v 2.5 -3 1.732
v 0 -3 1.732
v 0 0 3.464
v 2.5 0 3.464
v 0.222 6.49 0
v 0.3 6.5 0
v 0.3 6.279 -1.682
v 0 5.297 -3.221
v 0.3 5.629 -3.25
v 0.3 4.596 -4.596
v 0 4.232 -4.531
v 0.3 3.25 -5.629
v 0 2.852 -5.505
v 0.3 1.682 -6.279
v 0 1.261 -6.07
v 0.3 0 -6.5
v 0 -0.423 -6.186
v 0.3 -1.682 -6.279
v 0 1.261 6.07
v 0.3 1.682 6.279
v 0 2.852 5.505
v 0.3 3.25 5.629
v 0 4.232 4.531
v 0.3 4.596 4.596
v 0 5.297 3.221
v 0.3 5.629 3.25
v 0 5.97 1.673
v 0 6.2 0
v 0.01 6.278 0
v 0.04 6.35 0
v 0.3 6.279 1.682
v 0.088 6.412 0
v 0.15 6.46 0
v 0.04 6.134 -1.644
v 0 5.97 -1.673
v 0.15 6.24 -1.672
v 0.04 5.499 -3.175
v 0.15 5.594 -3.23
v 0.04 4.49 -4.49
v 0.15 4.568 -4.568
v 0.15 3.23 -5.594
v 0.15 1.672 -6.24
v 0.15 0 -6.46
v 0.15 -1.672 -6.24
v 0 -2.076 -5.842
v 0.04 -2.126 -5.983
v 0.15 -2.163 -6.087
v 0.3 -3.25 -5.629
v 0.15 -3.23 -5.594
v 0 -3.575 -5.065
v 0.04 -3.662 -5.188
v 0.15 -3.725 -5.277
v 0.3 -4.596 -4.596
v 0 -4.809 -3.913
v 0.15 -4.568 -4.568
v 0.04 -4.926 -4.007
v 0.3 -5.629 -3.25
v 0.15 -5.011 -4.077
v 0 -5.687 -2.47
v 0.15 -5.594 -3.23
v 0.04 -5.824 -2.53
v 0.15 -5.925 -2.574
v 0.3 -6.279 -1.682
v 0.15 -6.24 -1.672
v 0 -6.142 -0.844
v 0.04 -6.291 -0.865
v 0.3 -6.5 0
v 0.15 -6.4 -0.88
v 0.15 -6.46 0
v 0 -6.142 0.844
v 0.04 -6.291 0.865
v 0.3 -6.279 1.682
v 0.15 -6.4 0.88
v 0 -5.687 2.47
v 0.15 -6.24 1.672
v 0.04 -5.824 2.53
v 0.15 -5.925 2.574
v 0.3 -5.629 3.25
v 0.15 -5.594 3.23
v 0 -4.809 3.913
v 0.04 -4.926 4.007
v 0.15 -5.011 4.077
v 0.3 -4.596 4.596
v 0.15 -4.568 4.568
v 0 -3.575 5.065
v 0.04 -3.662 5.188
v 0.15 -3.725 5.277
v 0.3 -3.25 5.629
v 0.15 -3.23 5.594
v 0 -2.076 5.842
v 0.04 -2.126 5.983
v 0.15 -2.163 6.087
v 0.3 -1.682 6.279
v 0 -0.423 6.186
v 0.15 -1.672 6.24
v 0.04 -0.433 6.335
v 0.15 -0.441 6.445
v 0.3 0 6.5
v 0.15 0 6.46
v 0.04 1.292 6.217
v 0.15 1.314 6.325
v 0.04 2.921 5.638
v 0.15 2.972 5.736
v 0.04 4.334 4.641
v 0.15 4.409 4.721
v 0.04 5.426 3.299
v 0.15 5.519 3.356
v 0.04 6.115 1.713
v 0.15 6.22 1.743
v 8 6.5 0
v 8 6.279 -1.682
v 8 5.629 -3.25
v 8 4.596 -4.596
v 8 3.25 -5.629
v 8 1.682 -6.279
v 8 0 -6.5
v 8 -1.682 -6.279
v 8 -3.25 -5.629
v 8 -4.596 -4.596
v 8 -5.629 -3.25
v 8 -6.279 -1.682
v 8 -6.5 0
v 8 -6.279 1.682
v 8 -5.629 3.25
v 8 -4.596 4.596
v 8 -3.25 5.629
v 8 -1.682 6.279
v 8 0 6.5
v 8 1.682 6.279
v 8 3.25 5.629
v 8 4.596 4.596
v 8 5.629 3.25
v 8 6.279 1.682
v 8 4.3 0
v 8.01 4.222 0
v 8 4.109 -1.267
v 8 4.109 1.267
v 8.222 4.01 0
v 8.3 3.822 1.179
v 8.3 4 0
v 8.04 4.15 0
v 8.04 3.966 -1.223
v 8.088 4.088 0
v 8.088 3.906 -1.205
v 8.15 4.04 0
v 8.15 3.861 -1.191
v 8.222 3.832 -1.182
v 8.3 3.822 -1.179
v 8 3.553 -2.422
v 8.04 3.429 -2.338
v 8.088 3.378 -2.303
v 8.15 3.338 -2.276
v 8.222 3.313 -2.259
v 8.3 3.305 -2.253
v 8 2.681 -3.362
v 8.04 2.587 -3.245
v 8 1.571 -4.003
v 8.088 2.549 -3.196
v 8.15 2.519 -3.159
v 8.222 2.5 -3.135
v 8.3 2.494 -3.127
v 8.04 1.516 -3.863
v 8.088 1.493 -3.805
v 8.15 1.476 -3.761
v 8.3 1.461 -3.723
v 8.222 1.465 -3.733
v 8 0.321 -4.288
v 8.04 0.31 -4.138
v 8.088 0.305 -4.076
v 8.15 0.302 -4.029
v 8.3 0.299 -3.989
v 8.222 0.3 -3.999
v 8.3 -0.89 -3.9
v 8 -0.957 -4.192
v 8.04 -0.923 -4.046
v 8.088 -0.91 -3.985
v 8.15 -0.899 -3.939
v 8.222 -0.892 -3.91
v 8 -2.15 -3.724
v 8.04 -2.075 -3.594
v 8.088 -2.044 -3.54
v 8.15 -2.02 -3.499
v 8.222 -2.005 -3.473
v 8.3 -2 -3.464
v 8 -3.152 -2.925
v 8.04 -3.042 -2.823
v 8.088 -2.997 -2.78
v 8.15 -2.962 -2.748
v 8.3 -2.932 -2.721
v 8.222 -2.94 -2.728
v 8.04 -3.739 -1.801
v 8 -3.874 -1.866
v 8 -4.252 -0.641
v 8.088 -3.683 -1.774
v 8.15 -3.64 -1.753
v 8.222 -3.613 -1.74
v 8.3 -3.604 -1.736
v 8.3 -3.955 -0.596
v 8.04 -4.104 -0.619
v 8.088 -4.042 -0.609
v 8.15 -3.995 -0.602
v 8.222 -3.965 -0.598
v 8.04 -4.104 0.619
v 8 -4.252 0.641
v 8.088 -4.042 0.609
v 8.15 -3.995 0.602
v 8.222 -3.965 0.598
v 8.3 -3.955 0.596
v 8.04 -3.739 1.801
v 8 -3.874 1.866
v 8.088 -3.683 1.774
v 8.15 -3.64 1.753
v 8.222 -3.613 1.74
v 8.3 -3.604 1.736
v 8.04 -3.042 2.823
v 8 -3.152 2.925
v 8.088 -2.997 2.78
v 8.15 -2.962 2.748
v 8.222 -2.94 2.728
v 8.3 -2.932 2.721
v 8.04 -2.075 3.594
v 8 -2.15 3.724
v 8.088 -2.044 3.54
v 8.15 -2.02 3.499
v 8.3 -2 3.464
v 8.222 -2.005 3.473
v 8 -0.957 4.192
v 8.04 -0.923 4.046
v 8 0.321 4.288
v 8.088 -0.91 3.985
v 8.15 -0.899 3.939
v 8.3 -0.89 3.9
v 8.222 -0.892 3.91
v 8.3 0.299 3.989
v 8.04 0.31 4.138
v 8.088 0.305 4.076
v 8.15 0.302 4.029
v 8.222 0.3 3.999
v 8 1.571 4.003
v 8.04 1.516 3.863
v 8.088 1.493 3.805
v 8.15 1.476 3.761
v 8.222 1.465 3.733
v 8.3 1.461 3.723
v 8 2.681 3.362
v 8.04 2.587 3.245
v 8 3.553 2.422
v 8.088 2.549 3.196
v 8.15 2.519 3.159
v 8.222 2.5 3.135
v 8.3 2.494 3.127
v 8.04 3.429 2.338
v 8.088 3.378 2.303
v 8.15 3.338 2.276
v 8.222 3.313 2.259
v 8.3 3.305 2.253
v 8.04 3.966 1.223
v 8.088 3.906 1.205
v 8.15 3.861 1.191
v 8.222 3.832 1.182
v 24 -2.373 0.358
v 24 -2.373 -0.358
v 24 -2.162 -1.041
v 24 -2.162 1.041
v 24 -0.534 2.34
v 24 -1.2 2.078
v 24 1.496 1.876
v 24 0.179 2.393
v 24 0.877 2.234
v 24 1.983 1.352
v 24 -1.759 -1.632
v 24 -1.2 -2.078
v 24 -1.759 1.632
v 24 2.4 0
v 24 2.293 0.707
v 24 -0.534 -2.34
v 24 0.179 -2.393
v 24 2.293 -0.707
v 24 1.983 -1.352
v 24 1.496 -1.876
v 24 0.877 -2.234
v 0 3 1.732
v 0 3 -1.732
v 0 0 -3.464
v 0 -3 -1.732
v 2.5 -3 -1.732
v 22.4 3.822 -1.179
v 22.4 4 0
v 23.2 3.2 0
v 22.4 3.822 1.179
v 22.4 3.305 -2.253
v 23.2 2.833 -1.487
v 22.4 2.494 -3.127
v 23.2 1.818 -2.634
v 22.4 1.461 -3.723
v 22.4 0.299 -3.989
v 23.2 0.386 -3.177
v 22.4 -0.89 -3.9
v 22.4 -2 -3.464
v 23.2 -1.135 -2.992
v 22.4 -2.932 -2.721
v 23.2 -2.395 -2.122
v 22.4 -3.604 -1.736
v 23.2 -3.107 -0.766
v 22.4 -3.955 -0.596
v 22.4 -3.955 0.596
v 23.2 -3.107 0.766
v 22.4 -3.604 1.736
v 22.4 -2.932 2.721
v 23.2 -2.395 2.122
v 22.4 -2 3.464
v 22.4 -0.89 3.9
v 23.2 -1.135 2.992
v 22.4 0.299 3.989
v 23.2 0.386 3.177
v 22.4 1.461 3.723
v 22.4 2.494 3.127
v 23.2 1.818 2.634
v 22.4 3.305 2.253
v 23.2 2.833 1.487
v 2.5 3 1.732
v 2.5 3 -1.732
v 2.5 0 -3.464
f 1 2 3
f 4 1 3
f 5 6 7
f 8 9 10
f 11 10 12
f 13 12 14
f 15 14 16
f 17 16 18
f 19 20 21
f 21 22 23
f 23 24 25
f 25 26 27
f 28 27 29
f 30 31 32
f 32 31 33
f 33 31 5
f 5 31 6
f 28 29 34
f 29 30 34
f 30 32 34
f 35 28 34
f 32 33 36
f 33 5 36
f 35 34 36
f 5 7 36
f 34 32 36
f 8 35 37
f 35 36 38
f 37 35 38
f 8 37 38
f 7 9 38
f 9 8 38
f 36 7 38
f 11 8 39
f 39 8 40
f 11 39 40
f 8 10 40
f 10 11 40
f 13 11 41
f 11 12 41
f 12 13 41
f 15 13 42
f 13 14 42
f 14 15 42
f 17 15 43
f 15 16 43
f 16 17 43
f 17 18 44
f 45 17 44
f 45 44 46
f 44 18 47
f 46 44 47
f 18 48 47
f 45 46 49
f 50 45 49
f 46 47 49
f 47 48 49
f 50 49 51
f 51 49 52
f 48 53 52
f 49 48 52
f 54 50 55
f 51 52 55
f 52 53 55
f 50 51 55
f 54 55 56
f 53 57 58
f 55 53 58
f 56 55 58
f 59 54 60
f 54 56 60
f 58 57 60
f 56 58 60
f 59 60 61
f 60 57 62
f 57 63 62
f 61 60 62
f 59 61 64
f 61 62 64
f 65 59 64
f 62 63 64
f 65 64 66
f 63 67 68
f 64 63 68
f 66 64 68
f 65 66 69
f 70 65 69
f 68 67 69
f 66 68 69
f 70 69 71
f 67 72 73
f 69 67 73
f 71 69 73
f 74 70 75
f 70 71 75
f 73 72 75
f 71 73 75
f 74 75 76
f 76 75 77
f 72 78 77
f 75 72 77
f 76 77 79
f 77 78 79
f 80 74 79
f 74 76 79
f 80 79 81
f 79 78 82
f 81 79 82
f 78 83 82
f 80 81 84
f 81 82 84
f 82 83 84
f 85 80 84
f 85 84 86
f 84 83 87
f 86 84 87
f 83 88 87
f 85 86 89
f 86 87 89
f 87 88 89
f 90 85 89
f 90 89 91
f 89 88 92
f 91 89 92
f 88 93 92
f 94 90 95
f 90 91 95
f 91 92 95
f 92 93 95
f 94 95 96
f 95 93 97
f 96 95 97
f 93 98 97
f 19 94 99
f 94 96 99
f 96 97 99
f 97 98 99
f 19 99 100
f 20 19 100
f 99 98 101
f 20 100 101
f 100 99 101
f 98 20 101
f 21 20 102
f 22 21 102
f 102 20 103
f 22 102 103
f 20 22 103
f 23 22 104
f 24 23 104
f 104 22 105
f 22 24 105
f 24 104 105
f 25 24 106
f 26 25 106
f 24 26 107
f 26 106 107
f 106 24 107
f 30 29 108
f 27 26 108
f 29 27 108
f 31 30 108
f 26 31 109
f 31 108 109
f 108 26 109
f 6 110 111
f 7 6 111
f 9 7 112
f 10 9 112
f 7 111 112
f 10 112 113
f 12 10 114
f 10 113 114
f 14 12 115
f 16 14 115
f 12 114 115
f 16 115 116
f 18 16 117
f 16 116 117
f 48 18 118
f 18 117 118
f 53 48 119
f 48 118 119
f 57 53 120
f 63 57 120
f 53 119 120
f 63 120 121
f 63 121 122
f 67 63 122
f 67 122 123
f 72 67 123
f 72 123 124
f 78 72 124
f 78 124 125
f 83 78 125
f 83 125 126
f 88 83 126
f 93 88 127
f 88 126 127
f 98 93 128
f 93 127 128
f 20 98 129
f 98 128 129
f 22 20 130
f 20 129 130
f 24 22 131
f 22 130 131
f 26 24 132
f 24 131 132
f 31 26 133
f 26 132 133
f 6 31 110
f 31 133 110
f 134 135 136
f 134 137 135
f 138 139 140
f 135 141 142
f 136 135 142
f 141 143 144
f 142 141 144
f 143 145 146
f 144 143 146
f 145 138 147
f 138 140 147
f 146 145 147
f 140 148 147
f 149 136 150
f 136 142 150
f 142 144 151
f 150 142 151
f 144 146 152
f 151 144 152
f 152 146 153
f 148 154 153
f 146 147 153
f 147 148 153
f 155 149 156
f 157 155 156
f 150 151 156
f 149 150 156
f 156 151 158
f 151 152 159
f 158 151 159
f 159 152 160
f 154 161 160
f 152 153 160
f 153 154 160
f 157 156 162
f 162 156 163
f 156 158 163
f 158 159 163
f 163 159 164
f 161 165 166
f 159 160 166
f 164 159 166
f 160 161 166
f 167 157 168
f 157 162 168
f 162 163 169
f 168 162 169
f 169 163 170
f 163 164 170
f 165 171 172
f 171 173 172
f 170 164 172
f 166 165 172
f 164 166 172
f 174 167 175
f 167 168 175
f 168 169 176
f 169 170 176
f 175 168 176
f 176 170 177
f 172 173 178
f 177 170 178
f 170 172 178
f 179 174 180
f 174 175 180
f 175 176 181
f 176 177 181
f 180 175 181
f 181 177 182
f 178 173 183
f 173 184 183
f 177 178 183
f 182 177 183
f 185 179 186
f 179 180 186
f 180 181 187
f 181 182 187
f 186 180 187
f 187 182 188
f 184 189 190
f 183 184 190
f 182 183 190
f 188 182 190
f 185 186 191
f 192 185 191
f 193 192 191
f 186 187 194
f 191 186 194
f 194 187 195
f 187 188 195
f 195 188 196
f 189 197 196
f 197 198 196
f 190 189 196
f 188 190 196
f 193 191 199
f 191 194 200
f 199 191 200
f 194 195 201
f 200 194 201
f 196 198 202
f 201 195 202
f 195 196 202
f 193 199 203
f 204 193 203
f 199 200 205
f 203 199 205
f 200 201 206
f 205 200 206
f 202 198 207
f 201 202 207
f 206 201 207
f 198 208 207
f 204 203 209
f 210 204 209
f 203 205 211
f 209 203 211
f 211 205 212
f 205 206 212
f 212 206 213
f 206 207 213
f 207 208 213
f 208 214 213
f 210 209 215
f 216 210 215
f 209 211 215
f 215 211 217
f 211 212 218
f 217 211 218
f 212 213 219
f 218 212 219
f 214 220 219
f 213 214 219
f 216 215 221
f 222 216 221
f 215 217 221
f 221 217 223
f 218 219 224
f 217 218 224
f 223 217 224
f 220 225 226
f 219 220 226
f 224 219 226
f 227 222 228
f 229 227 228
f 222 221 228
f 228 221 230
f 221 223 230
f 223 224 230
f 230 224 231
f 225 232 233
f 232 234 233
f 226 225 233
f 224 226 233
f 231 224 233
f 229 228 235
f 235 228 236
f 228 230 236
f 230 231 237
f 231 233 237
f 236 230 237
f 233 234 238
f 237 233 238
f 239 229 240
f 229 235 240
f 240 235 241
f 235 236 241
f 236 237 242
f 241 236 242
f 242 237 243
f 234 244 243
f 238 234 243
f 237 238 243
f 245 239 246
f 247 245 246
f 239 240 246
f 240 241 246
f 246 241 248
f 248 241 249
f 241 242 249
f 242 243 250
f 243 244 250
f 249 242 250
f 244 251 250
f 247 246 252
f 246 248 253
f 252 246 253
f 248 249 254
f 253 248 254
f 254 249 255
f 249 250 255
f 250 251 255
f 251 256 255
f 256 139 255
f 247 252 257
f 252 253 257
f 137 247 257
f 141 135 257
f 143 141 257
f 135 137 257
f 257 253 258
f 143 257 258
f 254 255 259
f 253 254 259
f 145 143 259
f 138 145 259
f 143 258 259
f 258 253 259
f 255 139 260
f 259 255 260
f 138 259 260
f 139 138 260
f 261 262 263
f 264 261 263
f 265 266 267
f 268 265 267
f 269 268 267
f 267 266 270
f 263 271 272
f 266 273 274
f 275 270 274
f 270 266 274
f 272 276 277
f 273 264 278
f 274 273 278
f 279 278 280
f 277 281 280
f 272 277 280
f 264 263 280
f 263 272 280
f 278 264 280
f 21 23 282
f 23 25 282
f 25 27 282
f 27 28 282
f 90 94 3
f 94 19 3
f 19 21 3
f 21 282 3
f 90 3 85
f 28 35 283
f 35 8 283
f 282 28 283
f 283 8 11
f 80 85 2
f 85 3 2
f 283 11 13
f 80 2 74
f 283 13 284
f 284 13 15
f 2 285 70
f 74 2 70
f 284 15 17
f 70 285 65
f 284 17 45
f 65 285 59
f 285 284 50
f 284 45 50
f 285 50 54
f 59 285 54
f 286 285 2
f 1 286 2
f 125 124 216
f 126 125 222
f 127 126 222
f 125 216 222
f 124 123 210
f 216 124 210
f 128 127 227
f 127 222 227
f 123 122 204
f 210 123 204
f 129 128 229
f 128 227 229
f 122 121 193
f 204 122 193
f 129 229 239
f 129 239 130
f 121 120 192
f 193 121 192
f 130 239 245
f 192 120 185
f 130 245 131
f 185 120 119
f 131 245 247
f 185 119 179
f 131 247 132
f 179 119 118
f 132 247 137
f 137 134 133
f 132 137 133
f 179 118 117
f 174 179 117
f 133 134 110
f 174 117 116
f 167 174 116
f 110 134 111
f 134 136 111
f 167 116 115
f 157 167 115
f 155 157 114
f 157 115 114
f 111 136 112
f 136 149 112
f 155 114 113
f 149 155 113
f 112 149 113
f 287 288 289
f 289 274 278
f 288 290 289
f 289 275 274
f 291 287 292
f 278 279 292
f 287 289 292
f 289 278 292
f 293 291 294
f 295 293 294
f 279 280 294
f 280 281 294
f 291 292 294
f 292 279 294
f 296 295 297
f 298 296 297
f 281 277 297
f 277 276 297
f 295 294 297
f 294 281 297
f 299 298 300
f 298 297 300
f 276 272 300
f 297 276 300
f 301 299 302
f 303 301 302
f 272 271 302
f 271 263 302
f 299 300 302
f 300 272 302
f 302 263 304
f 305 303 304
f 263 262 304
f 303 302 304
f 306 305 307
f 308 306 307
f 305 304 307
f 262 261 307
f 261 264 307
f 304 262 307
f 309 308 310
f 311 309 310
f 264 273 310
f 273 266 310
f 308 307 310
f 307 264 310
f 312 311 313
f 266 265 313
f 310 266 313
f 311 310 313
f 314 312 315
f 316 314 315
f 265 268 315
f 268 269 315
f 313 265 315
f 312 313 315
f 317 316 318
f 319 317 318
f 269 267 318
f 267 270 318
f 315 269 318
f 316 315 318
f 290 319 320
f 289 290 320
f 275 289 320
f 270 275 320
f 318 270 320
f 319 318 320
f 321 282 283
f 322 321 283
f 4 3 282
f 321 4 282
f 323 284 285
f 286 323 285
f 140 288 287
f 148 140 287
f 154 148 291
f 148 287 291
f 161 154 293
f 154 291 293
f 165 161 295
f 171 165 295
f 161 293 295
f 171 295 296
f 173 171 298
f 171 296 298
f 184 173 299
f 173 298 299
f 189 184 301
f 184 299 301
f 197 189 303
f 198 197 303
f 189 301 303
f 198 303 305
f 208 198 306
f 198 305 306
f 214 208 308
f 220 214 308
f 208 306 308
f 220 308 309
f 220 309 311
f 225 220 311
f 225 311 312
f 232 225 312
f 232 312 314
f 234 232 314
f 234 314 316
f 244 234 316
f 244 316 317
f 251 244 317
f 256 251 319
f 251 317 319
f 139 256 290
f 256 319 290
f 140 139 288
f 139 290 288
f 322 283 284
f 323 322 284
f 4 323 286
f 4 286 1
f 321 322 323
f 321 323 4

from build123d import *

# Parameters (mm, degrees)
CUT_EXTRUDE_1_DEPTH = 2.5
FILLET_1_R          = 0.3
CHAMFER_1_SIZE      = 1.6


with BuildPart() as part:
    # Эскиз1 → Повернуть1 (revolve)
    with BuildSketch(Plane.XY):
        Polygon((0, 0), (0, 6.5), (8, 6.5), (8, 4), (24, 4), (24, 0), align=None)
    revolve(axis=Axis((24, 0, 0), (-1, 0, 0)))

    # Эскиз2 → Вырез-Вытянуть1 (cut)
    with BuildSketch(Plane.ZY):
        Polygon((-1.732050808, 3), (-3.464101615, 0), (-1.732050808, -3), (1.732050808, -3), (3.464101615, 0), (1.732050808, 3), align=None)
    extrude(amount=-CUT_EXTRUDE_1_DEPTH, mode=Mode.SUBTRACT)

    # Скругление1
    fillet_1_edges = [part.edges().sort_by_distance(p)[0] for p in [
        (8, -4, 0),
        (0, -6.5, 0),
    ]]
    fillet(fillet_1_edges, radius=FILLET_1_R)

    # Фаска1
    chamfer_1_edges = [part.edges().sort_by_distance(p)[0] for p in [
        (24, -4, 0),
    ]]
    chamfer(chamfer_1_edges, length=CHAMFER_1_SIZE)


solid = part.part
